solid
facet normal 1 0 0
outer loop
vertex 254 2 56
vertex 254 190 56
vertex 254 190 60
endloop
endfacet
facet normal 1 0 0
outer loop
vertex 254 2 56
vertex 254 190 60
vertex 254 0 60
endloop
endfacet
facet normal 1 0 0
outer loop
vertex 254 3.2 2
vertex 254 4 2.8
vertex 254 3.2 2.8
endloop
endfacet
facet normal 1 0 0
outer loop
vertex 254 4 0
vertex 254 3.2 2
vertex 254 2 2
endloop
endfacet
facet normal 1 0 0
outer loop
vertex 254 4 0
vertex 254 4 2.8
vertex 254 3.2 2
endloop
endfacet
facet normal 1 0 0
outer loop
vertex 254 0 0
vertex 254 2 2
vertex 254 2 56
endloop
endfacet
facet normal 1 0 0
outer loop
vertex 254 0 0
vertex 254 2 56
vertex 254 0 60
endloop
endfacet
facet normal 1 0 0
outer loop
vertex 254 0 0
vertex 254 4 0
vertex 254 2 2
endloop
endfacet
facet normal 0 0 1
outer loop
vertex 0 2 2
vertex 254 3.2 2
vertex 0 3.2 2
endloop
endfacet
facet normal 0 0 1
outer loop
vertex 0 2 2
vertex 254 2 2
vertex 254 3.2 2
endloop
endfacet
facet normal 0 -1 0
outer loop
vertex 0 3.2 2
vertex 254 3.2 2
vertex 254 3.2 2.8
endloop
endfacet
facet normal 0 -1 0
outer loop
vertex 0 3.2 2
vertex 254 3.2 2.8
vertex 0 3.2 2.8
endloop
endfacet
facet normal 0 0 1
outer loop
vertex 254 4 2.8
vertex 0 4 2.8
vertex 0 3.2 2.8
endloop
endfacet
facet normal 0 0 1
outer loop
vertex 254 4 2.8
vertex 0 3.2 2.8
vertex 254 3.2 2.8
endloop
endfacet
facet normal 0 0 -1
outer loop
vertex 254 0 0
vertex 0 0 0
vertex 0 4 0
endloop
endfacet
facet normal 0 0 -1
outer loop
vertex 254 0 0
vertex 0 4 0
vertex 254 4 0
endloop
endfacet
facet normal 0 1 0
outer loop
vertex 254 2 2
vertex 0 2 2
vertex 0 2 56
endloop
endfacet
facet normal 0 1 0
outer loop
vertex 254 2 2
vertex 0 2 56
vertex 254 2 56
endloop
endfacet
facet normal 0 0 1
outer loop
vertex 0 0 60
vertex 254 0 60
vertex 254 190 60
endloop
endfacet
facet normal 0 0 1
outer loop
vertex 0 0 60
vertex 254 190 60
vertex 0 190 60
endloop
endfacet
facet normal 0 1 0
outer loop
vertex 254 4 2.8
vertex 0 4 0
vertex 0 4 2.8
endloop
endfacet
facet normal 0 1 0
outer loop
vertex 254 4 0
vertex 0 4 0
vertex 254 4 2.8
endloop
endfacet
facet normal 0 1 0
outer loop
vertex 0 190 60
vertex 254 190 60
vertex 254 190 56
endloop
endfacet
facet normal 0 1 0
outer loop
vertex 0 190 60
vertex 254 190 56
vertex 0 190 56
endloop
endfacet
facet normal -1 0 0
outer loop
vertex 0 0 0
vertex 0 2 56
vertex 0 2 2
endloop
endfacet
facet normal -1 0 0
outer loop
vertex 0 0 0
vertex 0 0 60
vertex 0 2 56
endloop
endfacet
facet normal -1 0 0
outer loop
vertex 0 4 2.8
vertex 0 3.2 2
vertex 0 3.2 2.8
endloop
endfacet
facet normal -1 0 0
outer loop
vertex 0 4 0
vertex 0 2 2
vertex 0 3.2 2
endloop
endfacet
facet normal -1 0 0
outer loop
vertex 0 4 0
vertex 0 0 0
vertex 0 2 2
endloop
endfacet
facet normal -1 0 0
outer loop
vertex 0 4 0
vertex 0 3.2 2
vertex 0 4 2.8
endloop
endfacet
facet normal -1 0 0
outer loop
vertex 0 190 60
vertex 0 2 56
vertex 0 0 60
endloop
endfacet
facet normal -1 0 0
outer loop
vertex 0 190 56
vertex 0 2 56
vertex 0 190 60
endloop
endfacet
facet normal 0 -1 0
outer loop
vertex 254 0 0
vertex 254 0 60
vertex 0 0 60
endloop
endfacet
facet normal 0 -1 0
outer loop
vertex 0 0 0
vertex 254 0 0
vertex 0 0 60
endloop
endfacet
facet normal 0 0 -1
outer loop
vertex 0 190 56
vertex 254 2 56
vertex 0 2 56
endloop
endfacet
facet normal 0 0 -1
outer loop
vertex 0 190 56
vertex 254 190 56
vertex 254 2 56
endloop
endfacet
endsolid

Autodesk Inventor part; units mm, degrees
ref_plane "YZ Plane" through (0, 0, 0) normal (1, 0, 0) x (0, 1, 0)
ref_plane "XZ Plane" through (0, 0, 0) normal (0, 1, 0) x (-1, 0, 0)
ref_plane "XY Plane" through (0, 0, 0) normal (0, 0, 1) x (1, 0, 0)
sketch "草圖1" plane through (0, 0, 0) normal (0, 1, 0) x (-1, 0, 0)
  line L0 (0, 0) -> (-254, 0)
  line L1 (-254, 0) -> (-254, 60)
  line L2 (-254, 60) -> (0, 60)
  line L3 (0, 60) -> (0, 0)
  dimension "d0" = 254
  dimension "d1" = 60
extrude "擠出1" add sketch "草圖1" along normal blind 190
sketch "草圖2" plane through (0, 190, 0) normal (0, 1, 0) x (1, 0, 0)
  line L0 (254, 0) -> (0, 0) projected
  line L1 (0, 0) -> (254, 0)
  line L2 (254, 0) -> (254, -56)
  line L3 (254, -56) -> (0, -56)
  line L4 (0, -56) -> (0, 0)
  dimension "d4" = 254
  dimension "d5" = 56
extrude "擠出2" cut sketch "草圖2" against normal blind 188
sketch "草圖3" plane through (0, 2, 0) normal (0, 1, 0) x (1, 0, 0)
  line L0 (0, 0) -> (254, 0)
  line L1 (254, 0) -> (254, -2)
  line L2 (254, -2) -> (0, -2)
  line L3 (0, -2) -> (0, 0)
  dimension "d8" = 254
  dimension "d9" = 2
extrude "擠出3" add sketch "草圖3" along normal blind 2
sketch "草圖4" plane through (0, 2, 2) normal (0, 0, 1) x (1, 0, 0)
  line L0 (0, 2) -> (254, 2) projected
  line L1 (0, 2) -> (254, 2)
  line L2 (254, 2) -> (254, 1.2)
  line L3 (254, 1.2) -> (0, 1.2)
  line L4 (0, 1.2) -> (0, 2)
  point P0 (0, -2)
  dimension "d12" = 254
  dimension "d13" = 0.8
extrude "擠出4" add sketch "草圖4" along normal blind 0.8
properties part number "包包分隔檔板"
